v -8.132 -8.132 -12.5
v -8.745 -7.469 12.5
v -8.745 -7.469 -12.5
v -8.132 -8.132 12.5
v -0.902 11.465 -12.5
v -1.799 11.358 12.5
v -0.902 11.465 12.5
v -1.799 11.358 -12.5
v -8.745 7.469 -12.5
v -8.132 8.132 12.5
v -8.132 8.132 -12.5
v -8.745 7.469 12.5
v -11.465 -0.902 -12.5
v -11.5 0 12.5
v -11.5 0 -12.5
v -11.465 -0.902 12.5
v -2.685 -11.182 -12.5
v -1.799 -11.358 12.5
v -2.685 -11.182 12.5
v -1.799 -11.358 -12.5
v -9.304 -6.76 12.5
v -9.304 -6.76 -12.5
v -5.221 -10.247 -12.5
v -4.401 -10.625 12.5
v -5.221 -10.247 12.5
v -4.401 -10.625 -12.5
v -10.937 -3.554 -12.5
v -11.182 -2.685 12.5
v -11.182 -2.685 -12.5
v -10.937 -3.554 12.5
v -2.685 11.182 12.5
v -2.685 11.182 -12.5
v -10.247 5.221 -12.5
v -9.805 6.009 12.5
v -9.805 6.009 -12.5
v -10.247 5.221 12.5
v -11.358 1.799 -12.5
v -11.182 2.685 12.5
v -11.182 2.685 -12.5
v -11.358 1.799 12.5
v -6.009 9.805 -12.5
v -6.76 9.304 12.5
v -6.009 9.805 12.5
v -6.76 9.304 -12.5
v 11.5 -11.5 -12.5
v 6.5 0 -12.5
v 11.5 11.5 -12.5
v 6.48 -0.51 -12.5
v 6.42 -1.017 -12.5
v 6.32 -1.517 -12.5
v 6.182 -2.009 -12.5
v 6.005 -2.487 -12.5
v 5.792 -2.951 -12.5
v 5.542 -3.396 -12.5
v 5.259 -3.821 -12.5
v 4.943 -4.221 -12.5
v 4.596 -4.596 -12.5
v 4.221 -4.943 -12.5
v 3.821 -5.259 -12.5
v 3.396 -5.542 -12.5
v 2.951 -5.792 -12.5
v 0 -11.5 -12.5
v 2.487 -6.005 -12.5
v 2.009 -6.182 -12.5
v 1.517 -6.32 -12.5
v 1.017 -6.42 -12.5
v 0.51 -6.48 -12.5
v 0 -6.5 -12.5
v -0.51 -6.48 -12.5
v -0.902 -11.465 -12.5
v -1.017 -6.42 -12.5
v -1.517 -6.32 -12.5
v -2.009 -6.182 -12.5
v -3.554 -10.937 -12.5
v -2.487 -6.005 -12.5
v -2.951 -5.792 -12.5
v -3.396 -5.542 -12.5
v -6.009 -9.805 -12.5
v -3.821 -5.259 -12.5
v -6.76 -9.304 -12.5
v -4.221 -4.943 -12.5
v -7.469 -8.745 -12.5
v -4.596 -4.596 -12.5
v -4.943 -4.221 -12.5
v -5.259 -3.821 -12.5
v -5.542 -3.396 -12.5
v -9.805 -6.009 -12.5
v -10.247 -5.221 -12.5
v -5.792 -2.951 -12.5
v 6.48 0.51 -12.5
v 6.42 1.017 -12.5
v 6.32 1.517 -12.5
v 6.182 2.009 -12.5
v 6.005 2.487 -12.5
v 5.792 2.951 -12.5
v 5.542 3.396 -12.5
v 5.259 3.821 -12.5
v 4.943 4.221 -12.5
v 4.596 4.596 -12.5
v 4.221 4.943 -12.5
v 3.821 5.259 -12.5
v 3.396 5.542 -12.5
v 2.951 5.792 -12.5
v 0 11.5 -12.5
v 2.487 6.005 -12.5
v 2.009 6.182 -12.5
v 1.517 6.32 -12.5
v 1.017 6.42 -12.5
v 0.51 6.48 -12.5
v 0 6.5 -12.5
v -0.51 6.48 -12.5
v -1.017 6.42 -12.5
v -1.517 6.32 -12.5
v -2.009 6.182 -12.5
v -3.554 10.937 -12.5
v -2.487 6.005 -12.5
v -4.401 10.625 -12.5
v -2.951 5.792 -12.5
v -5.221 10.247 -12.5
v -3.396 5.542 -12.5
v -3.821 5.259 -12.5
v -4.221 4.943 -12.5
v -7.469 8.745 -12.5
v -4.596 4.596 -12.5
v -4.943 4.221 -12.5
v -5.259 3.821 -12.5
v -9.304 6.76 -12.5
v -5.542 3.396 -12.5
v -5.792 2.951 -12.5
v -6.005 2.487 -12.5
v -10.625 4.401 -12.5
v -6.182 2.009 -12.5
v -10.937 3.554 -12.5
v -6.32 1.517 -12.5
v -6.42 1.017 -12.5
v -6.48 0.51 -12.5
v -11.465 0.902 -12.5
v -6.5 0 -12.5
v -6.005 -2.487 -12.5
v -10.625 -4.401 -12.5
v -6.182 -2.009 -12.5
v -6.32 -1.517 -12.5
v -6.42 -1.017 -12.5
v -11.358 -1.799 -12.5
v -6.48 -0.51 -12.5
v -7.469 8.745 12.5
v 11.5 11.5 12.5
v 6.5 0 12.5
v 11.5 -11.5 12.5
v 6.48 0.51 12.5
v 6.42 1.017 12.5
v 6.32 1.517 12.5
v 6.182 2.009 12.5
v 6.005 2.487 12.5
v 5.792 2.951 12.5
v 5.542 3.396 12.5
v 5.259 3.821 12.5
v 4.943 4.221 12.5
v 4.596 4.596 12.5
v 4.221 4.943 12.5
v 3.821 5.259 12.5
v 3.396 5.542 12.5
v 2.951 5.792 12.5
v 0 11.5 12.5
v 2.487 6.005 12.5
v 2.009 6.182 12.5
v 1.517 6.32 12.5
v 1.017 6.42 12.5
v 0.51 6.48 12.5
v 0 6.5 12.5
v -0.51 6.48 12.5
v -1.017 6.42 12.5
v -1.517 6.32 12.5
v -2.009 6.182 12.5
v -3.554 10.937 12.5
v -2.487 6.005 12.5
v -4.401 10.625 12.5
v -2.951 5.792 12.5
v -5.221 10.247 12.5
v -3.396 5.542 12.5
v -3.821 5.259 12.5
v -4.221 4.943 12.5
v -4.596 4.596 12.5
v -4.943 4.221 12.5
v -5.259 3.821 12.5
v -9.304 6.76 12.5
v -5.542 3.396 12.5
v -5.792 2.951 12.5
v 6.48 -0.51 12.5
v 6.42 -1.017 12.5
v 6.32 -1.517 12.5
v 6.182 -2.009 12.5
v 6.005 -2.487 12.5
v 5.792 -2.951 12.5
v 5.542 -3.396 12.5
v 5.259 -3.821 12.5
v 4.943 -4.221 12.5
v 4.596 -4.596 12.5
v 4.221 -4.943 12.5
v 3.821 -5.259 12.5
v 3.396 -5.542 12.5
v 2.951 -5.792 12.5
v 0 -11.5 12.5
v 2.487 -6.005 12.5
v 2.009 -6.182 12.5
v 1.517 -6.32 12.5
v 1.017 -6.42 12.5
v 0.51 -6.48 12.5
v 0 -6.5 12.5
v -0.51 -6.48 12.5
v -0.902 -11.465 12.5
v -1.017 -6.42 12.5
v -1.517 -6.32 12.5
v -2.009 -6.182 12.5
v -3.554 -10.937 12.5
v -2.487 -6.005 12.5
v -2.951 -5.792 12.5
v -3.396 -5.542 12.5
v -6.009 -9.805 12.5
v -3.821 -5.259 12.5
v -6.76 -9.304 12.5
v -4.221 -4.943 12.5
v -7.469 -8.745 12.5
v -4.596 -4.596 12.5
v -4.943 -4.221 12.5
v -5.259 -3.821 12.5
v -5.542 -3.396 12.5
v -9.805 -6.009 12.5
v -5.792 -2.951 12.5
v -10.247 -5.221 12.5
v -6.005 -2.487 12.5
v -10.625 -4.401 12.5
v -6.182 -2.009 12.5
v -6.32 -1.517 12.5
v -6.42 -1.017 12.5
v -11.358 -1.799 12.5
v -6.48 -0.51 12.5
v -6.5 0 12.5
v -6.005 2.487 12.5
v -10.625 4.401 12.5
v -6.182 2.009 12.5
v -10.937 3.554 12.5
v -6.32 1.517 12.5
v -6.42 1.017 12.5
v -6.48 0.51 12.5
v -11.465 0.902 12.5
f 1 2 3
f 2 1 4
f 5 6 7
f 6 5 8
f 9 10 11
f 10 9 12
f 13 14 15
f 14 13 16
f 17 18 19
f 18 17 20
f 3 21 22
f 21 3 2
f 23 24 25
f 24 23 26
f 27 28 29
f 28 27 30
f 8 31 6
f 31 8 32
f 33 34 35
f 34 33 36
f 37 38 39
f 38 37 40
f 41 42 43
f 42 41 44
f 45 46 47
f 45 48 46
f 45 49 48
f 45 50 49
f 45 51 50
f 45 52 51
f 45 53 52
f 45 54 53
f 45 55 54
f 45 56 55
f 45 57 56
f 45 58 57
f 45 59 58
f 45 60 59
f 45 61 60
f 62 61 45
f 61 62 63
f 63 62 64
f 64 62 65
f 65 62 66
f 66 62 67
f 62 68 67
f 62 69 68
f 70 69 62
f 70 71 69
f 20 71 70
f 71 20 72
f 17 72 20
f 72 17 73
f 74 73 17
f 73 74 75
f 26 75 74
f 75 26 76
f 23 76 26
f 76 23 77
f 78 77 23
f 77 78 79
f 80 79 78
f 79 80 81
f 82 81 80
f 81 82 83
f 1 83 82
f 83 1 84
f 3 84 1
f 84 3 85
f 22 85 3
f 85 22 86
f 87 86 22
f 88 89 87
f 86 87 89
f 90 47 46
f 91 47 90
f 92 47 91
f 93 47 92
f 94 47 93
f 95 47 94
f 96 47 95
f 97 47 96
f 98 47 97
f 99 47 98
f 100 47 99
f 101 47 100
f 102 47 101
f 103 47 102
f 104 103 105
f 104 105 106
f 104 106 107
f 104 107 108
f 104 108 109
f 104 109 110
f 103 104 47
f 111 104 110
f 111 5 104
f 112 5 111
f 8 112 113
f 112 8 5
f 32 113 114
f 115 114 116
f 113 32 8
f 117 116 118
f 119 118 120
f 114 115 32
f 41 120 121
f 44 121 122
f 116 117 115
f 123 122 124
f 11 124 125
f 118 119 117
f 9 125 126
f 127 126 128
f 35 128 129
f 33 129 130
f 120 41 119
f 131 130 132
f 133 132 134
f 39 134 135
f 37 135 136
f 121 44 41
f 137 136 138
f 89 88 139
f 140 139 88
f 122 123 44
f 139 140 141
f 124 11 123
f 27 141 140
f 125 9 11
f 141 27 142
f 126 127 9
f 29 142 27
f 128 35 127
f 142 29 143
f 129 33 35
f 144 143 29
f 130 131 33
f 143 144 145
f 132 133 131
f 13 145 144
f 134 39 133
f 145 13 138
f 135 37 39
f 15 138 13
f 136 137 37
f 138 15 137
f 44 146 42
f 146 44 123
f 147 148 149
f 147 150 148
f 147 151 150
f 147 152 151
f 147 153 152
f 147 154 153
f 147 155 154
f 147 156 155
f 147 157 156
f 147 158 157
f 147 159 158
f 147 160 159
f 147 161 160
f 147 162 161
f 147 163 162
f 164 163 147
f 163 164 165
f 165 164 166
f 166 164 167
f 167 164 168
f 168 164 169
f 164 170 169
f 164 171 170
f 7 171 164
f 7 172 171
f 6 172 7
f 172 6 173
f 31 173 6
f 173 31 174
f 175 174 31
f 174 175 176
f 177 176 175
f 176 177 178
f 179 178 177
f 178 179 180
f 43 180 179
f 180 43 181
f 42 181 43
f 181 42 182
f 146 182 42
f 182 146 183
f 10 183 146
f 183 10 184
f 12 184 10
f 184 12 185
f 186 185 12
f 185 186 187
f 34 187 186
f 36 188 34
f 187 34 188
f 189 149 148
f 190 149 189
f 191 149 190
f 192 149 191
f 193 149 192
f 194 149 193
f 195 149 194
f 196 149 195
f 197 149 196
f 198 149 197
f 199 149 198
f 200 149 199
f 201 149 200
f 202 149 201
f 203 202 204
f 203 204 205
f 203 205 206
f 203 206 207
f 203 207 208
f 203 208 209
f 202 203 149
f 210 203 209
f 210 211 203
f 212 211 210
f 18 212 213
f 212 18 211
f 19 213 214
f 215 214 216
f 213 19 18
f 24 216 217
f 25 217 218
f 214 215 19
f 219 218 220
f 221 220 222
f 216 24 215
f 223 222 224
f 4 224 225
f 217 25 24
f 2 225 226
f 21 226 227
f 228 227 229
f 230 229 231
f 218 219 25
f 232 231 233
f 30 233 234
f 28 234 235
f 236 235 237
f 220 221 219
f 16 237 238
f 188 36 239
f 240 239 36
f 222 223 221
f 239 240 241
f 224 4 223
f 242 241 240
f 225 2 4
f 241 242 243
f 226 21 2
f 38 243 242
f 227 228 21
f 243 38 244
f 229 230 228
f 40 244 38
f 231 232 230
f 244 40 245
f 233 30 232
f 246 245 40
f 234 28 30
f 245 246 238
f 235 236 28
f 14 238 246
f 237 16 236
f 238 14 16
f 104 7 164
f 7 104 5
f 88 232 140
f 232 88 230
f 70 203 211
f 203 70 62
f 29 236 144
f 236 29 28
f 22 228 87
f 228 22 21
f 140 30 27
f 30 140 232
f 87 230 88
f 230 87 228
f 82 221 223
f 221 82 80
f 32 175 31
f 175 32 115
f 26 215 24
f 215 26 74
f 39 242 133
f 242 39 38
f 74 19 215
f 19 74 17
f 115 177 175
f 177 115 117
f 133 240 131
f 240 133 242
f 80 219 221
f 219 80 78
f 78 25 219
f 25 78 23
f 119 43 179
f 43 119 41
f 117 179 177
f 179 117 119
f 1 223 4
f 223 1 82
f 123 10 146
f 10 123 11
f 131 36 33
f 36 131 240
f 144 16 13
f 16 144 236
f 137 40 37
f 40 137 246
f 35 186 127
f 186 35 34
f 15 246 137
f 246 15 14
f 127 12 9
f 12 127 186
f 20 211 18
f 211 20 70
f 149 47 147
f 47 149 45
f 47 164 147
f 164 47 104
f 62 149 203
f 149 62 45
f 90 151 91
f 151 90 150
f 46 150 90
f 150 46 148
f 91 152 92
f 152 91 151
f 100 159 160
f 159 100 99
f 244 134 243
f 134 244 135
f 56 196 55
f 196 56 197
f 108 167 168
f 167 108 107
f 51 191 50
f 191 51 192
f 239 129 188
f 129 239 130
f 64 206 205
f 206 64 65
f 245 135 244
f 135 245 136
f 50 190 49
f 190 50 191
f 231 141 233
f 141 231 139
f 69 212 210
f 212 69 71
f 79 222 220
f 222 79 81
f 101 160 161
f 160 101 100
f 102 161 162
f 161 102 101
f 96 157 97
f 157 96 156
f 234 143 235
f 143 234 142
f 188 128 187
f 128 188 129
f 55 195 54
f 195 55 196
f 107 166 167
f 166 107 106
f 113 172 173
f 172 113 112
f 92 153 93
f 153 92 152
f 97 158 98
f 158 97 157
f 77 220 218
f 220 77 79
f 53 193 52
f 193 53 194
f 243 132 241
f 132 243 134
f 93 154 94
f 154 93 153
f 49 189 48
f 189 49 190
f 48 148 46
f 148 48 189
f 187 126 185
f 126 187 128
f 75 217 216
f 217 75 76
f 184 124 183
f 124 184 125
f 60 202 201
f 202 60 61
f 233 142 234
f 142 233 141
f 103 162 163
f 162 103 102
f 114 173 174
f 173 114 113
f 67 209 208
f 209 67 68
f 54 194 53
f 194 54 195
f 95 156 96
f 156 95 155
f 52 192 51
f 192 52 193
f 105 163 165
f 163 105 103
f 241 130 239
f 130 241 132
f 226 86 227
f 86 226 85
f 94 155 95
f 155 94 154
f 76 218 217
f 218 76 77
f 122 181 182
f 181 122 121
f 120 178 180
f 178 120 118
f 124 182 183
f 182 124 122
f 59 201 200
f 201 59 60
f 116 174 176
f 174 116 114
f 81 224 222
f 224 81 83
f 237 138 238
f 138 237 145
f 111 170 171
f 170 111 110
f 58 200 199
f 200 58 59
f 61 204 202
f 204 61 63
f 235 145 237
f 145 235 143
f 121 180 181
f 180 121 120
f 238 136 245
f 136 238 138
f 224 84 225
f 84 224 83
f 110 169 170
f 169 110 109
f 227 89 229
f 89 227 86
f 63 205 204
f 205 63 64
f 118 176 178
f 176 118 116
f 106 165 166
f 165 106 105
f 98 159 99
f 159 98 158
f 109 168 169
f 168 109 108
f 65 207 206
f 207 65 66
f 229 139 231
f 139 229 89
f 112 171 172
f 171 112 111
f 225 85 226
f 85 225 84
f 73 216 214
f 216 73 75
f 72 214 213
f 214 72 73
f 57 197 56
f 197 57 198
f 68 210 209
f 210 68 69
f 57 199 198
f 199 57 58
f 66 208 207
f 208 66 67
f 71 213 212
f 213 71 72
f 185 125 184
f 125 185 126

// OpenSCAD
$fn = 80;
H = 25;
ID = 13;
OD = ID + 10;

// This is a hack; I'm supergluing it on the side of a blank AH HECK!  I've been getting x-carriage vs y-carriage backwards this whole time!
difference() {
  union() {
    cylinder(d=OD,h=H,center=true);
    translate([OD/4,0,0]) cube([OD/2,OD,H],center=true);
  }
  cylinder(d=ID,h=1000,center=true);
}
